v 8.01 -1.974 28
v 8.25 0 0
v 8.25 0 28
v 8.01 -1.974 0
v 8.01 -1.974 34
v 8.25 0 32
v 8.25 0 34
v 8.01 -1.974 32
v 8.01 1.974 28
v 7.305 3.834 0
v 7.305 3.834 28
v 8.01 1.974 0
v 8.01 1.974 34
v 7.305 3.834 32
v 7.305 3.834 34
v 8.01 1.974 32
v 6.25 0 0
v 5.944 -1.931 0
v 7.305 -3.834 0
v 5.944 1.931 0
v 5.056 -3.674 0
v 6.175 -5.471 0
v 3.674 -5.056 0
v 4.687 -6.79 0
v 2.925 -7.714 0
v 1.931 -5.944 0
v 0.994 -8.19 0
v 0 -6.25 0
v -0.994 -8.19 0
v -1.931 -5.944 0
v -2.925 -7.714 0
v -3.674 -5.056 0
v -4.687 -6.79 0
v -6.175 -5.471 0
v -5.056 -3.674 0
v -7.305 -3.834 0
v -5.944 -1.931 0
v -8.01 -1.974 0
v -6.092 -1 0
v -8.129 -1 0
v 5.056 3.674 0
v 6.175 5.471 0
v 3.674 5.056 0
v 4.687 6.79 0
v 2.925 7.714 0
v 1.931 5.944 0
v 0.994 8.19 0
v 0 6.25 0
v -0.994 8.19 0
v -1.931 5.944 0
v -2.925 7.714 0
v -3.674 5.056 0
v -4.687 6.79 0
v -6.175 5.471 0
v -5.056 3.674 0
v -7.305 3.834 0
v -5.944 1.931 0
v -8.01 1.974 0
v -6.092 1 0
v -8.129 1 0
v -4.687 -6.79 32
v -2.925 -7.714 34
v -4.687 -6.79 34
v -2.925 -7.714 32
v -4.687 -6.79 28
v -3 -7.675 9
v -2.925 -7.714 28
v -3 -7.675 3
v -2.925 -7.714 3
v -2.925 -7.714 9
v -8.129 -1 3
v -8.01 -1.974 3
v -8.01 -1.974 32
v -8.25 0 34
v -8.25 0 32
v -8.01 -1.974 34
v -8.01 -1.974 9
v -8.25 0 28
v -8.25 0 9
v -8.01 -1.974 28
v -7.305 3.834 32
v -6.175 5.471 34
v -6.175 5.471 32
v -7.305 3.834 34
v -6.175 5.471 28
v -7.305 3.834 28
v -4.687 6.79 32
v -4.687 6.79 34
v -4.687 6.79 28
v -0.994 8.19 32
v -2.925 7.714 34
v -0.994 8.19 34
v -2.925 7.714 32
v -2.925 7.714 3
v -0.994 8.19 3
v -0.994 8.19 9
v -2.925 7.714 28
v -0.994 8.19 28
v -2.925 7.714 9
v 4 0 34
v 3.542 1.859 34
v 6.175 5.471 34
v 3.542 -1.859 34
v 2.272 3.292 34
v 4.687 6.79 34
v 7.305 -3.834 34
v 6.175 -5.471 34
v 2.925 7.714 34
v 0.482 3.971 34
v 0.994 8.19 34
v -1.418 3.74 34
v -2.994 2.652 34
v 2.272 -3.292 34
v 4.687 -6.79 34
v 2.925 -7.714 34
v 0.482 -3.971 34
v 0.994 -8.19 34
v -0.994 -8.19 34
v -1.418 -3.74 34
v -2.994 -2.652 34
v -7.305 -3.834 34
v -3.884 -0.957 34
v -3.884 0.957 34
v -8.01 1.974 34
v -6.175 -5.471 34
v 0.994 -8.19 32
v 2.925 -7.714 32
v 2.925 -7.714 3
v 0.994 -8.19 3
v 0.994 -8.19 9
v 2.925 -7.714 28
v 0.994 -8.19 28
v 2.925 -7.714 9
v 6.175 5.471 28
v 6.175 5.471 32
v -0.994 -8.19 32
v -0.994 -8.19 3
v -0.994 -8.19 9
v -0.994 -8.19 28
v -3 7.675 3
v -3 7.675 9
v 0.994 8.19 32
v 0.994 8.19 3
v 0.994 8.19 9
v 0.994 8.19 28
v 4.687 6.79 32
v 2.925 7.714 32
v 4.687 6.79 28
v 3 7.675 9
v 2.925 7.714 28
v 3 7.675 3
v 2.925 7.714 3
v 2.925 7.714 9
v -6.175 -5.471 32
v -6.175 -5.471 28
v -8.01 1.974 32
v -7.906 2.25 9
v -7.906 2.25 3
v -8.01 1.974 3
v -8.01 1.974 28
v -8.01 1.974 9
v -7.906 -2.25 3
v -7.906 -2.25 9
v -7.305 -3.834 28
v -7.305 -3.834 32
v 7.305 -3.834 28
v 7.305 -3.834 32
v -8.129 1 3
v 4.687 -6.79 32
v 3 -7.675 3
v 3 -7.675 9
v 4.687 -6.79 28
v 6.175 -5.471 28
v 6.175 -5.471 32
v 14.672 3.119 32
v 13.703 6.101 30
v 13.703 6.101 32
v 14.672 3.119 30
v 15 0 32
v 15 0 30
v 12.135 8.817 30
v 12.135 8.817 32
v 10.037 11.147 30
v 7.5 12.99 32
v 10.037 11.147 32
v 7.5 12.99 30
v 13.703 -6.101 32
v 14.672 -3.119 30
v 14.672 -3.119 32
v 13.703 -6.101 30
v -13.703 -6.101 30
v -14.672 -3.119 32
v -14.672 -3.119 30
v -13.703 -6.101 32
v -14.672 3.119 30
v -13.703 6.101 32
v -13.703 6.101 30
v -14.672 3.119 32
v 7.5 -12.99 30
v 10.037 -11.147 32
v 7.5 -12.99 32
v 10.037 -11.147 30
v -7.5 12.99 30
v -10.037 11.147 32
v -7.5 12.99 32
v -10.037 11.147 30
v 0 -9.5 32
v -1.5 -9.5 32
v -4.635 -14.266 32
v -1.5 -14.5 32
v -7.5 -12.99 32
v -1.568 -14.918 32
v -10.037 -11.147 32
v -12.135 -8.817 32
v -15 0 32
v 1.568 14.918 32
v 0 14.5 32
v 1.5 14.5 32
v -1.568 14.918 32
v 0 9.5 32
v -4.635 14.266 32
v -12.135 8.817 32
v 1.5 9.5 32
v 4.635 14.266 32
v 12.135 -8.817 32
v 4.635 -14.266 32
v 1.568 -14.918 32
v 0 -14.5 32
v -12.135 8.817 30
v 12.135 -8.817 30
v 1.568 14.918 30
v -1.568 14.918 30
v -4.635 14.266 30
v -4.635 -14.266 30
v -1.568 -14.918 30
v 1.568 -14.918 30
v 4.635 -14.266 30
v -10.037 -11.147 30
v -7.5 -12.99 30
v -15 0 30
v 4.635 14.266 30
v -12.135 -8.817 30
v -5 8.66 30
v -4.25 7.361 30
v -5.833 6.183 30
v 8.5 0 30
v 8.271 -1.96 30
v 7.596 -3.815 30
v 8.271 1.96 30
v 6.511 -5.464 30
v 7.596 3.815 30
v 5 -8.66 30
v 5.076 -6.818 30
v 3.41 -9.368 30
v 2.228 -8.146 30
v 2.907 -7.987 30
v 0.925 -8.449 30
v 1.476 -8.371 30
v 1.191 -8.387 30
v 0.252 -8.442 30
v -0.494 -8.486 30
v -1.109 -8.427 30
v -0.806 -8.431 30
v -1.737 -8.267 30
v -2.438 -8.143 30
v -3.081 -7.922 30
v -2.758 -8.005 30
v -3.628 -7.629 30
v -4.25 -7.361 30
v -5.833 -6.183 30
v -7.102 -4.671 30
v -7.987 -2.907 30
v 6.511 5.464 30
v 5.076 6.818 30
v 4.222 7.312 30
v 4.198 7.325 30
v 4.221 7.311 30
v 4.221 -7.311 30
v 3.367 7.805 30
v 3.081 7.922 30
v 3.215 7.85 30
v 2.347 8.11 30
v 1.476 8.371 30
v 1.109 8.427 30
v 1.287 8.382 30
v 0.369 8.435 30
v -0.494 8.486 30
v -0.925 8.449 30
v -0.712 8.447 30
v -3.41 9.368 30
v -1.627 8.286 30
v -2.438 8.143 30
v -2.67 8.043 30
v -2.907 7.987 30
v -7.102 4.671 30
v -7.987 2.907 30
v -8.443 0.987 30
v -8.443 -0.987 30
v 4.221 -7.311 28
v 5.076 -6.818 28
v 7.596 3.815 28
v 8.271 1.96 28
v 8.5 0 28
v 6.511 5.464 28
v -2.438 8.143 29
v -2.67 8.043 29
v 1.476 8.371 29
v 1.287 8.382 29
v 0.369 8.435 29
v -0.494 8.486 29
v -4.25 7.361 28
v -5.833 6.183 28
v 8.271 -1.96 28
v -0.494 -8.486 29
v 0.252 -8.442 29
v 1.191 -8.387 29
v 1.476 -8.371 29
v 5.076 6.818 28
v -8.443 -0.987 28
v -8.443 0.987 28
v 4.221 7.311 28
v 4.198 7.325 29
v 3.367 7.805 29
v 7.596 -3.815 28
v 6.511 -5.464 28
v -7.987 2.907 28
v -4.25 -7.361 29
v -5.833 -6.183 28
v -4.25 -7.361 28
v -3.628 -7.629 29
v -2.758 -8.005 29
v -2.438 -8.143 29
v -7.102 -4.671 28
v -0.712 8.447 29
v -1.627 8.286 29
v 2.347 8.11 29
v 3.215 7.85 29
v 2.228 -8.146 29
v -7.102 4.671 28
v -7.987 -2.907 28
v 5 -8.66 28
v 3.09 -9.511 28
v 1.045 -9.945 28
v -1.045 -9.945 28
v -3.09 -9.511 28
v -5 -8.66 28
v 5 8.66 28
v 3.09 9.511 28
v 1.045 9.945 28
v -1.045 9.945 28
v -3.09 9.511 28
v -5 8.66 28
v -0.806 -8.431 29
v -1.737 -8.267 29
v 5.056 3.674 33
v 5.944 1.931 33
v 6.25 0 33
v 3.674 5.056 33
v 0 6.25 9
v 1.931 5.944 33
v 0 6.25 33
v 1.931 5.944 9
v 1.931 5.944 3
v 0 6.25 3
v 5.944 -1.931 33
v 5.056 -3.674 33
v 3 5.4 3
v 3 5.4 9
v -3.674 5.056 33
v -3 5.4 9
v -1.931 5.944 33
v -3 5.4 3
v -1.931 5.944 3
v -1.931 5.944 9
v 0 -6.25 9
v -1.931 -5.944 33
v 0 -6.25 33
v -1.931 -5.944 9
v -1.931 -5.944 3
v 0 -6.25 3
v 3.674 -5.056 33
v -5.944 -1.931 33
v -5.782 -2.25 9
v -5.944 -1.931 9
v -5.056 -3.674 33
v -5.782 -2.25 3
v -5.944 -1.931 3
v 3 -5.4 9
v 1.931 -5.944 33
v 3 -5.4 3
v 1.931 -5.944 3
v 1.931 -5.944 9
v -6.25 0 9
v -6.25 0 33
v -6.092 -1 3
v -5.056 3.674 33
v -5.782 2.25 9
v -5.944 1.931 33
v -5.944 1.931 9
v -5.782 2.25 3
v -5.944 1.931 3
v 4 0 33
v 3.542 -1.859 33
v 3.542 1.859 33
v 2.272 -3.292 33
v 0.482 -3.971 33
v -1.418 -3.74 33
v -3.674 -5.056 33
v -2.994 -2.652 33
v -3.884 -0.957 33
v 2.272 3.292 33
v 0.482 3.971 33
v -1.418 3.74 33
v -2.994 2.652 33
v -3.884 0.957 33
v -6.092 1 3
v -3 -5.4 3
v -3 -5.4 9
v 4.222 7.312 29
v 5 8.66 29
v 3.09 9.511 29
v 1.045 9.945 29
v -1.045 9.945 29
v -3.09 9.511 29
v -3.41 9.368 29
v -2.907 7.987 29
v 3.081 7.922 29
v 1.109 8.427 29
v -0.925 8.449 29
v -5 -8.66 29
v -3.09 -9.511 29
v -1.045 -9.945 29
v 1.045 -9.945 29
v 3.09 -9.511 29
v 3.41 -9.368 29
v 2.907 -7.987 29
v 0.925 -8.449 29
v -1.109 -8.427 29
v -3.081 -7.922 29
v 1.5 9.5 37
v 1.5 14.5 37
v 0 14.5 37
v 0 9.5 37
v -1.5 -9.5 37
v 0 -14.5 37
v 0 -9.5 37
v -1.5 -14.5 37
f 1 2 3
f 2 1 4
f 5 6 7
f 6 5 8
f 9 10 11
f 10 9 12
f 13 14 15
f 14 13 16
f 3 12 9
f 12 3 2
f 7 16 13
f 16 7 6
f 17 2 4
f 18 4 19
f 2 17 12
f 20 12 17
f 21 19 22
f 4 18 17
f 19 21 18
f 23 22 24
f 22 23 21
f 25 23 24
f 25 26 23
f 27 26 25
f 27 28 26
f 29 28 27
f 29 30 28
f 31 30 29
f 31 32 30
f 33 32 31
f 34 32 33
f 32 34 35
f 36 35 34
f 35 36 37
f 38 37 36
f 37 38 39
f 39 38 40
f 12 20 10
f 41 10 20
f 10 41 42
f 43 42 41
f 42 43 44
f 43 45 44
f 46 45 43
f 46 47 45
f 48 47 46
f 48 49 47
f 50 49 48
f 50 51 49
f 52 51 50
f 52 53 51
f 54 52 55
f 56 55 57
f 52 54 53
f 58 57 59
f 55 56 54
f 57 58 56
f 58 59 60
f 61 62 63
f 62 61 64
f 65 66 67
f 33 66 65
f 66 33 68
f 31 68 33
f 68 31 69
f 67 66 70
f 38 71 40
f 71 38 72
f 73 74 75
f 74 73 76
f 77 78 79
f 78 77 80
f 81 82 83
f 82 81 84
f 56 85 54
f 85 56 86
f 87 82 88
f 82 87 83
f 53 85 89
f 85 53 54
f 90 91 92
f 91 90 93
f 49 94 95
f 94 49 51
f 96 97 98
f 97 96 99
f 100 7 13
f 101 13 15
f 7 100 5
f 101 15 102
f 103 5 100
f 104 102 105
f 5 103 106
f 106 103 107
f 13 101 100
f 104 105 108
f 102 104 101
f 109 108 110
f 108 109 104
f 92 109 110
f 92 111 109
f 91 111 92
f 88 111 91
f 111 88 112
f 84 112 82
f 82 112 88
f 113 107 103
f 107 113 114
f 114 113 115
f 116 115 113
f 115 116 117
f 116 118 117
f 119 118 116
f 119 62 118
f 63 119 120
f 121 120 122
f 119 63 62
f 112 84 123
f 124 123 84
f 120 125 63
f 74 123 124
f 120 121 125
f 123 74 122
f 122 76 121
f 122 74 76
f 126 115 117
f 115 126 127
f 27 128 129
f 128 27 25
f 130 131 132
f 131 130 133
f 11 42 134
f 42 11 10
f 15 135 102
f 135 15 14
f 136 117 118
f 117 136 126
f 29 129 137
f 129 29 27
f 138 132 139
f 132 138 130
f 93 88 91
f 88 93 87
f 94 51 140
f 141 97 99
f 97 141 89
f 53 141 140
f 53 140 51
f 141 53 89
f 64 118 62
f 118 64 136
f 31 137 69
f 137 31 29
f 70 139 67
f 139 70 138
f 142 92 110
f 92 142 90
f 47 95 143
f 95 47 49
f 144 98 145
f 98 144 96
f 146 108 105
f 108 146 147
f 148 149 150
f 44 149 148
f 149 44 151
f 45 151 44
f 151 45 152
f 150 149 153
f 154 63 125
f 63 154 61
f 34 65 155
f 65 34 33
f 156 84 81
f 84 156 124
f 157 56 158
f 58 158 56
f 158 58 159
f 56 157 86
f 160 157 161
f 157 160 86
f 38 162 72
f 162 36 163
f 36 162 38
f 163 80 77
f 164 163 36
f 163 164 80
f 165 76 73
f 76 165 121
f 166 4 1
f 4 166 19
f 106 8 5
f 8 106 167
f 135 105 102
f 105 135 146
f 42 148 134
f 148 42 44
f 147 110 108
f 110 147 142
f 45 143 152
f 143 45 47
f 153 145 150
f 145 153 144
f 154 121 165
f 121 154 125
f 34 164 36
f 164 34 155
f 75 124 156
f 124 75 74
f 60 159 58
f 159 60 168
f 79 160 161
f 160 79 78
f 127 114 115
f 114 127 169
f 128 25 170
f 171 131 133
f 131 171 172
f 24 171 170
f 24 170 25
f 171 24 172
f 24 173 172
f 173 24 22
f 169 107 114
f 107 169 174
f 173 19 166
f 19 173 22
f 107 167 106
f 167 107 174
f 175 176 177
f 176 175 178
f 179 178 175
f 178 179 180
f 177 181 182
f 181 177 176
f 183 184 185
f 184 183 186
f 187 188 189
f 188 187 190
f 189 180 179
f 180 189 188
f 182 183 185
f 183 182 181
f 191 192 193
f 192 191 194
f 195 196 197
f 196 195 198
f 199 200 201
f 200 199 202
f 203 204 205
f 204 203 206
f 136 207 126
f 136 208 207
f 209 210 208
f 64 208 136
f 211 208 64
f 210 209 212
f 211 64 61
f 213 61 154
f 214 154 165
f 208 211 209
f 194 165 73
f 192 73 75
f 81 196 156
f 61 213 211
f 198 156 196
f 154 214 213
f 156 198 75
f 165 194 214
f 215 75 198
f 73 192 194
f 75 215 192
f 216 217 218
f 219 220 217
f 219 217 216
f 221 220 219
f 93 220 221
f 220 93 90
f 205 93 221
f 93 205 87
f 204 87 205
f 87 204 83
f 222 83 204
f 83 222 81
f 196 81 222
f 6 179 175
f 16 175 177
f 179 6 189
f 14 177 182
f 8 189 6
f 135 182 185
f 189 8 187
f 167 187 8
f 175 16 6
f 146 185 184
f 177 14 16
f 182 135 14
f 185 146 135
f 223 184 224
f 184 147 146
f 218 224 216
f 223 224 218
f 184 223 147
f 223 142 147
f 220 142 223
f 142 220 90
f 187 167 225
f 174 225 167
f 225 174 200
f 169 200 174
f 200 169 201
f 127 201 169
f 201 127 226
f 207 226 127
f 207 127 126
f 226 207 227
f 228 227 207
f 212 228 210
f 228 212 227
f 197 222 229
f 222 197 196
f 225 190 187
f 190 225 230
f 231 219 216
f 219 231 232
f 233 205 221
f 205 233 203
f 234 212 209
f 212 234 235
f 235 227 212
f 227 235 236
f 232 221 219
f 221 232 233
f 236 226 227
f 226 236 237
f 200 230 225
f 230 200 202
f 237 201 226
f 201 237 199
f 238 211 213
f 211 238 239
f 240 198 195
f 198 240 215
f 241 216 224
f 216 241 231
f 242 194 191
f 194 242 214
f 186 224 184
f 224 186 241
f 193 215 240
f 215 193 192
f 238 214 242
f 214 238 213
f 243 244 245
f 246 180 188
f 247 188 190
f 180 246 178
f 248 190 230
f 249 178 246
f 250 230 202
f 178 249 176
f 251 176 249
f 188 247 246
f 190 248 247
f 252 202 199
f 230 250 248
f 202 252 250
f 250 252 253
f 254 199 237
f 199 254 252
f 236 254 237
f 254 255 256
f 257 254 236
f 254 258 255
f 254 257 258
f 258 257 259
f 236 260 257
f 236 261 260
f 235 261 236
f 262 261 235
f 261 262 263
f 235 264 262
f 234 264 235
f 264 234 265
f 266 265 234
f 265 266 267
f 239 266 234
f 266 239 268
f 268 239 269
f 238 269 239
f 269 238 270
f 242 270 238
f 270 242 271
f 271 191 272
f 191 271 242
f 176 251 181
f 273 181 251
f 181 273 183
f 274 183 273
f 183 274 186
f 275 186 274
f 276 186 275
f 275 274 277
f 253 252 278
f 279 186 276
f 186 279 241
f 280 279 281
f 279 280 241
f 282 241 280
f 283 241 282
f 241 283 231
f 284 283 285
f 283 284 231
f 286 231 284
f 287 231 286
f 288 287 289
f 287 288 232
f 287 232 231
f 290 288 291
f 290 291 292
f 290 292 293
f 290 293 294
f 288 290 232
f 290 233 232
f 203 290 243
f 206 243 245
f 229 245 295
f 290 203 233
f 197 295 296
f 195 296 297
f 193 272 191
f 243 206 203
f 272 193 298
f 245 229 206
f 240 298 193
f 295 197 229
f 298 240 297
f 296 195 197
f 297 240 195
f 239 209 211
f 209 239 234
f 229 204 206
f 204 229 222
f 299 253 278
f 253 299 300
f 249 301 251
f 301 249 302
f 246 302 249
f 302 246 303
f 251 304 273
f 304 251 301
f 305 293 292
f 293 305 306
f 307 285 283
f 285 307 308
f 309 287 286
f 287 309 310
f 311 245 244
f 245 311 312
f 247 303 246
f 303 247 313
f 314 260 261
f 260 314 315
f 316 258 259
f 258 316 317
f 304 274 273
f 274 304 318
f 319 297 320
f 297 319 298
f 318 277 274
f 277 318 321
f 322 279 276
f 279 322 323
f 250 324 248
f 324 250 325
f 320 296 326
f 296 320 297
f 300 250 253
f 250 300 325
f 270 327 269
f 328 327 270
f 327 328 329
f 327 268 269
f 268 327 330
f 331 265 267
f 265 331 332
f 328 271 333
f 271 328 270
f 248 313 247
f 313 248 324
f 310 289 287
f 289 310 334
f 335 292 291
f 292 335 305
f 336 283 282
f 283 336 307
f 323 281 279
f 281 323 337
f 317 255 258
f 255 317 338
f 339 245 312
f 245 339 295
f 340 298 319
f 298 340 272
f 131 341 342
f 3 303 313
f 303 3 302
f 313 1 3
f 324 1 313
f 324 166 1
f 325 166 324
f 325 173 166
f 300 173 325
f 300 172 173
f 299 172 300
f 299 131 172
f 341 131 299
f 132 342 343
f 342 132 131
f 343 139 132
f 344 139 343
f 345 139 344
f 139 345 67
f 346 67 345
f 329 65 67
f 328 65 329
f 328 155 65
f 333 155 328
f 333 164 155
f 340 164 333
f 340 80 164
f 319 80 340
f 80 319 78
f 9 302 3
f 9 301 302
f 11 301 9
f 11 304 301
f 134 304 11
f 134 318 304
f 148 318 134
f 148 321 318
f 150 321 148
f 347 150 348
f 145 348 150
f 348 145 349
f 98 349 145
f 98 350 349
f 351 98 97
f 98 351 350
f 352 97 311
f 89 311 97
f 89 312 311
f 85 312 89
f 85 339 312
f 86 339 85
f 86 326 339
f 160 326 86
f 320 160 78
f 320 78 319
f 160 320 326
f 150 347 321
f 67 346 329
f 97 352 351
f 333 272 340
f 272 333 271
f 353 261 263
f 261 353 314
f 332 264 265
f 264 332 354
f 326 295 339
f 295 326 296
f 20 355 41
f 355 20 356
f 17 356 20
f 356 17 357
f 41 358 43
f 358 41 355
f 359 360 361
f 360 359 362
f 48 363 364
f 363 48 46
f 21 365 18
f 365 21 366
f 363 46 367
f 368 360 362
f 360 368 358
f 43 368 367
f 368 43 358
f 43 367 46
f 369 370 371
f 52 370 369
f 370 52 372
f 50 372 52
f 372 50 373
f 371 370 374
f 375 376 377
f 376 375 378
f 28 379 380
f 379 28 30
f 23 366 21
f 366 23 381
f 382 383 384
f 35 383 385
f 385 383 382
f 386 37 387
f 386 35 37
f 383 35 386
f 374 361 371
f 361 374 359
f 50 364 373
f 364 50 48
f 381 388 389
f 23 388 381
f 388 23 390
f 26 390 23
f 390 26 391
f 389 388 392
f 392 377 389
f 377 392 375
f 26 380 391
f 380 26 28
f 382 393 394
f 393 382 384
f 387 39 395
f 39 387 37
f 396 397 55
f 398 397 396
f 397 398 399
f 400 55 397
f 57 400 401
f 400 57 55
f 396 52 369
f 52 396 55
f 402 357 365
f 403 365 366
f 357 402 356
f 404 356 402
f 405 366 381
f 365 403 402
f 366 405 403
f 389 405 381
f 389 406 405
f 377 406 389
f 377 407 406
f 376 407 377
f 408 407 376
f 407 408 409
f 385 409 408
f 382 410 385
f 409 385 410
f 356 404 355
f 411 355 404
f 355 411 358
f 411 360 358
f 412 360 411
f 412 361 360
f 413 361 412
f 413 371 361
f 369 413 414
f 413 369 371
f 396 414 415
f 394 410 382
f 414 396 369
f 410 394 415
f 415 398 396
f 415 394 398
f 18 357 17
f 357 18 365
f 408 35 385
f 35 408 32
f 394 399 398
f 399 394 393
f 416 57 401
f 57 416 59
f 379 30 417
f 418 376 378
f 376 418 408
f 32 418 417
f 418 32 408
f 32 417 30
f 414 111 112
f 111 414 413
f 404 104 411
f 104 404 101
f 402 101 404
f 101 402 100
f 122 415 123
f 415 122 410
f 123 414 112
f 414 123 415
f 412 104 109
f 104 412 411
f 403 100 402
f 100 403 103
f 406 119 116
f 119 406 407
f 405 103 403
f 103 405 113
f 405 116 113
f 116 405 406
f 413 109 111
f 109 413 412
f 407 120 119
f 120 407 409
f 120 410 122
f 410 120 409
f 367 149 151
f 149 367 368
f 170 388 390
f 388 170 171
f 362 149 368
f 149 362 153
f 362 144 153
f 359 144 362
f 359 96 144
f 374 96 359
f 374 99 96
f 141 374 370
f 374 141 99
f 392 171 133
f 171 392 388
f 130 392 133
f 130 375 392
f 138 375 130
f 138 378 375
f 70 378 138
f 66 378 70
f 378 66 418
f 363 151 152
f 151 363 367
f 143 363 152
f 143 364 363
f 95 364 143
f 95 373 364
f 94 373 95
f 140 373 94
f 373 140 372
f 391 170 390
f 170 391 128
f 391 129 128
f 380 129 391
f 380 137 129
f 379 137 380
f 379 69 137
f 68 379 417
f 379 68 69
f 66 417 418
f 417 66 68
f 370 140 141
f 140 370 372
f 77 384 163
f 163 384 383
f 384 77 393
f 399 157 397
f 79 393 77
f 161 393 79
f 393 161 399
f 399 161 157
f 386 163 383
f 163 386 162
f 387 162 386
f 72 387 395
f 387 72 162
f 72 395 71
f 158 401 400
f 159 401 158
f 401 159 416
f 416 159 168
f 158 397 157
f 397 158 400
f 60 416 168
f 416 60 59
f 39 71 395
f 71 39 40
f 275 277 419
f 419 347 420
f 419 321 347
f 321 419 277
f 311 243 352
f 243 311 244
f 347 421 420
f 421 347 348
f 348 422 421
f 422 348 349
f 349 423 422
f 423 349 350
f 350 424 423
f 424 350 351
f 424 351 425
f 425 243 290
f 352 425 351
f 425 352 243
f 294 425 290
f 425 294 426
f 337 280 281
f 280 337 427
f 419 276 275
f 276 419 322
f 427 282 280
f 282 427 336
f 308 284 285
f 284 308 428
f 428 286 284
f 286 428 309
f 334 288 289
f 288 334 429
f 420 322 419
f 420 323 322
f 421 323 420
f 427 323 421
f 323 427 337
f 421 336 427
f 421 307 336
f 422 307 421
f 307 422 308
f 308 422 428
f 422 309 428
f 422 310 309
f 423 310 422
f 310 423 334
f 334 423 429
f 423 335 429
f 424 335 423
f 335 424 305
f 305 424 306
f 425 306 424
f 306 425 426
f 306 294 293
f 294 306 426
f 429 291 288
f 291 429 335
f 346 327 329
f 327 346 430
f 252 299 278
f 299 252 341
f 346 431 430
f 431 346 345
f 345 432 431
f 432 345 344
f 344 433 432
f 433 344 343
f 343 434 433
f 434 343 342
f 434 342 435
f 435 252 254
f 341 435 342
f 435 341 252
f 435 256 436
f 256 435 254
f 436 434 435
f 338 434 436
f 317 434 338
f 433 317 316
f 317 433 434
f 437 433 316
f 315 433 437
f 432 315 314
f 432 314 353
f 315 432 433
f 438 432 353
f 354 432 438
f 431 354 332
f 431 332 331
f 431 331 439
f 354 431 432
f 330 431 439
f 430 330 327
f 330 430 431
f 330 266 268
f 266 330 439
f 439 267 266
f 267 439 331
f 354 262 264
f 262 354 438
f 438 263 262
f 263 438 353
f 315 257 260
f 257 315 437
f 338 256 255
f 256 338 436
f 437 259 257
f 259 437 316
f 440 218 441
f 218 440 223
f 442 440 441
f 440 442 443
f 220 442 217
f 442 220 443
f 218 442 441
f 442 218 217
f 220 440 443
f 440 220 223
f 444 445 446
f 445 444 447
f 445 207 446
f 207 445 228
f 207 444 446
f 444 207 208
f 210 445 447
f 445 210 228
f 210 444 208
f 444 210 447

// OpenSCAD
difference() {
    union() {
        cylinder(h=34, r=8.25);
        translate([0,0,30]) cylinder(h=2, r=15);
        translate([0,0,28]) cylinder(h=2, r=8.5);
    }
    translate([0,0,-1]) cylinder(h=34, r=6.25);
    translate([0,0,30]) cylinder(h=7, r=4);

    translate([0,0,6]) cube([6,20,6], center = true);


    rotate([0,0,90]) translate([0,10,6]) cube([4.5,20,6], center = true);

    rotate([0,0,90]) translate([0,10,1]) cube([2,20,6], center = true);
}

difference() {
 rotate([0,0,60]) translate([0,0,29])  rotate_extrude(angle=60) translate([9,0,0]) square([2,2],center=true); 
    
    rotate([0,0,55]) translate([0,0,29.5]) rotate_extrude(angle=55) translate([9.5,0,0]) square([2,1],center=true); 
}

difference() {
    rotate([0,0,240]) translate([0,0,29]) rotate_extrude(angle=60) translate([9,0,0])     square([2,2],center=true);
    
    rotate([0,0,235]) translate([0,0,29.5]) rotate_extrude(angle=55) translate([9.5,0,0]) square([2,1],center=true); 
}

translate([0,9.5,32]) cube([1.5,5,5]);

rotate([0,0,180]) translate([0,9.5,32]) cube([1.5,5,5]);
